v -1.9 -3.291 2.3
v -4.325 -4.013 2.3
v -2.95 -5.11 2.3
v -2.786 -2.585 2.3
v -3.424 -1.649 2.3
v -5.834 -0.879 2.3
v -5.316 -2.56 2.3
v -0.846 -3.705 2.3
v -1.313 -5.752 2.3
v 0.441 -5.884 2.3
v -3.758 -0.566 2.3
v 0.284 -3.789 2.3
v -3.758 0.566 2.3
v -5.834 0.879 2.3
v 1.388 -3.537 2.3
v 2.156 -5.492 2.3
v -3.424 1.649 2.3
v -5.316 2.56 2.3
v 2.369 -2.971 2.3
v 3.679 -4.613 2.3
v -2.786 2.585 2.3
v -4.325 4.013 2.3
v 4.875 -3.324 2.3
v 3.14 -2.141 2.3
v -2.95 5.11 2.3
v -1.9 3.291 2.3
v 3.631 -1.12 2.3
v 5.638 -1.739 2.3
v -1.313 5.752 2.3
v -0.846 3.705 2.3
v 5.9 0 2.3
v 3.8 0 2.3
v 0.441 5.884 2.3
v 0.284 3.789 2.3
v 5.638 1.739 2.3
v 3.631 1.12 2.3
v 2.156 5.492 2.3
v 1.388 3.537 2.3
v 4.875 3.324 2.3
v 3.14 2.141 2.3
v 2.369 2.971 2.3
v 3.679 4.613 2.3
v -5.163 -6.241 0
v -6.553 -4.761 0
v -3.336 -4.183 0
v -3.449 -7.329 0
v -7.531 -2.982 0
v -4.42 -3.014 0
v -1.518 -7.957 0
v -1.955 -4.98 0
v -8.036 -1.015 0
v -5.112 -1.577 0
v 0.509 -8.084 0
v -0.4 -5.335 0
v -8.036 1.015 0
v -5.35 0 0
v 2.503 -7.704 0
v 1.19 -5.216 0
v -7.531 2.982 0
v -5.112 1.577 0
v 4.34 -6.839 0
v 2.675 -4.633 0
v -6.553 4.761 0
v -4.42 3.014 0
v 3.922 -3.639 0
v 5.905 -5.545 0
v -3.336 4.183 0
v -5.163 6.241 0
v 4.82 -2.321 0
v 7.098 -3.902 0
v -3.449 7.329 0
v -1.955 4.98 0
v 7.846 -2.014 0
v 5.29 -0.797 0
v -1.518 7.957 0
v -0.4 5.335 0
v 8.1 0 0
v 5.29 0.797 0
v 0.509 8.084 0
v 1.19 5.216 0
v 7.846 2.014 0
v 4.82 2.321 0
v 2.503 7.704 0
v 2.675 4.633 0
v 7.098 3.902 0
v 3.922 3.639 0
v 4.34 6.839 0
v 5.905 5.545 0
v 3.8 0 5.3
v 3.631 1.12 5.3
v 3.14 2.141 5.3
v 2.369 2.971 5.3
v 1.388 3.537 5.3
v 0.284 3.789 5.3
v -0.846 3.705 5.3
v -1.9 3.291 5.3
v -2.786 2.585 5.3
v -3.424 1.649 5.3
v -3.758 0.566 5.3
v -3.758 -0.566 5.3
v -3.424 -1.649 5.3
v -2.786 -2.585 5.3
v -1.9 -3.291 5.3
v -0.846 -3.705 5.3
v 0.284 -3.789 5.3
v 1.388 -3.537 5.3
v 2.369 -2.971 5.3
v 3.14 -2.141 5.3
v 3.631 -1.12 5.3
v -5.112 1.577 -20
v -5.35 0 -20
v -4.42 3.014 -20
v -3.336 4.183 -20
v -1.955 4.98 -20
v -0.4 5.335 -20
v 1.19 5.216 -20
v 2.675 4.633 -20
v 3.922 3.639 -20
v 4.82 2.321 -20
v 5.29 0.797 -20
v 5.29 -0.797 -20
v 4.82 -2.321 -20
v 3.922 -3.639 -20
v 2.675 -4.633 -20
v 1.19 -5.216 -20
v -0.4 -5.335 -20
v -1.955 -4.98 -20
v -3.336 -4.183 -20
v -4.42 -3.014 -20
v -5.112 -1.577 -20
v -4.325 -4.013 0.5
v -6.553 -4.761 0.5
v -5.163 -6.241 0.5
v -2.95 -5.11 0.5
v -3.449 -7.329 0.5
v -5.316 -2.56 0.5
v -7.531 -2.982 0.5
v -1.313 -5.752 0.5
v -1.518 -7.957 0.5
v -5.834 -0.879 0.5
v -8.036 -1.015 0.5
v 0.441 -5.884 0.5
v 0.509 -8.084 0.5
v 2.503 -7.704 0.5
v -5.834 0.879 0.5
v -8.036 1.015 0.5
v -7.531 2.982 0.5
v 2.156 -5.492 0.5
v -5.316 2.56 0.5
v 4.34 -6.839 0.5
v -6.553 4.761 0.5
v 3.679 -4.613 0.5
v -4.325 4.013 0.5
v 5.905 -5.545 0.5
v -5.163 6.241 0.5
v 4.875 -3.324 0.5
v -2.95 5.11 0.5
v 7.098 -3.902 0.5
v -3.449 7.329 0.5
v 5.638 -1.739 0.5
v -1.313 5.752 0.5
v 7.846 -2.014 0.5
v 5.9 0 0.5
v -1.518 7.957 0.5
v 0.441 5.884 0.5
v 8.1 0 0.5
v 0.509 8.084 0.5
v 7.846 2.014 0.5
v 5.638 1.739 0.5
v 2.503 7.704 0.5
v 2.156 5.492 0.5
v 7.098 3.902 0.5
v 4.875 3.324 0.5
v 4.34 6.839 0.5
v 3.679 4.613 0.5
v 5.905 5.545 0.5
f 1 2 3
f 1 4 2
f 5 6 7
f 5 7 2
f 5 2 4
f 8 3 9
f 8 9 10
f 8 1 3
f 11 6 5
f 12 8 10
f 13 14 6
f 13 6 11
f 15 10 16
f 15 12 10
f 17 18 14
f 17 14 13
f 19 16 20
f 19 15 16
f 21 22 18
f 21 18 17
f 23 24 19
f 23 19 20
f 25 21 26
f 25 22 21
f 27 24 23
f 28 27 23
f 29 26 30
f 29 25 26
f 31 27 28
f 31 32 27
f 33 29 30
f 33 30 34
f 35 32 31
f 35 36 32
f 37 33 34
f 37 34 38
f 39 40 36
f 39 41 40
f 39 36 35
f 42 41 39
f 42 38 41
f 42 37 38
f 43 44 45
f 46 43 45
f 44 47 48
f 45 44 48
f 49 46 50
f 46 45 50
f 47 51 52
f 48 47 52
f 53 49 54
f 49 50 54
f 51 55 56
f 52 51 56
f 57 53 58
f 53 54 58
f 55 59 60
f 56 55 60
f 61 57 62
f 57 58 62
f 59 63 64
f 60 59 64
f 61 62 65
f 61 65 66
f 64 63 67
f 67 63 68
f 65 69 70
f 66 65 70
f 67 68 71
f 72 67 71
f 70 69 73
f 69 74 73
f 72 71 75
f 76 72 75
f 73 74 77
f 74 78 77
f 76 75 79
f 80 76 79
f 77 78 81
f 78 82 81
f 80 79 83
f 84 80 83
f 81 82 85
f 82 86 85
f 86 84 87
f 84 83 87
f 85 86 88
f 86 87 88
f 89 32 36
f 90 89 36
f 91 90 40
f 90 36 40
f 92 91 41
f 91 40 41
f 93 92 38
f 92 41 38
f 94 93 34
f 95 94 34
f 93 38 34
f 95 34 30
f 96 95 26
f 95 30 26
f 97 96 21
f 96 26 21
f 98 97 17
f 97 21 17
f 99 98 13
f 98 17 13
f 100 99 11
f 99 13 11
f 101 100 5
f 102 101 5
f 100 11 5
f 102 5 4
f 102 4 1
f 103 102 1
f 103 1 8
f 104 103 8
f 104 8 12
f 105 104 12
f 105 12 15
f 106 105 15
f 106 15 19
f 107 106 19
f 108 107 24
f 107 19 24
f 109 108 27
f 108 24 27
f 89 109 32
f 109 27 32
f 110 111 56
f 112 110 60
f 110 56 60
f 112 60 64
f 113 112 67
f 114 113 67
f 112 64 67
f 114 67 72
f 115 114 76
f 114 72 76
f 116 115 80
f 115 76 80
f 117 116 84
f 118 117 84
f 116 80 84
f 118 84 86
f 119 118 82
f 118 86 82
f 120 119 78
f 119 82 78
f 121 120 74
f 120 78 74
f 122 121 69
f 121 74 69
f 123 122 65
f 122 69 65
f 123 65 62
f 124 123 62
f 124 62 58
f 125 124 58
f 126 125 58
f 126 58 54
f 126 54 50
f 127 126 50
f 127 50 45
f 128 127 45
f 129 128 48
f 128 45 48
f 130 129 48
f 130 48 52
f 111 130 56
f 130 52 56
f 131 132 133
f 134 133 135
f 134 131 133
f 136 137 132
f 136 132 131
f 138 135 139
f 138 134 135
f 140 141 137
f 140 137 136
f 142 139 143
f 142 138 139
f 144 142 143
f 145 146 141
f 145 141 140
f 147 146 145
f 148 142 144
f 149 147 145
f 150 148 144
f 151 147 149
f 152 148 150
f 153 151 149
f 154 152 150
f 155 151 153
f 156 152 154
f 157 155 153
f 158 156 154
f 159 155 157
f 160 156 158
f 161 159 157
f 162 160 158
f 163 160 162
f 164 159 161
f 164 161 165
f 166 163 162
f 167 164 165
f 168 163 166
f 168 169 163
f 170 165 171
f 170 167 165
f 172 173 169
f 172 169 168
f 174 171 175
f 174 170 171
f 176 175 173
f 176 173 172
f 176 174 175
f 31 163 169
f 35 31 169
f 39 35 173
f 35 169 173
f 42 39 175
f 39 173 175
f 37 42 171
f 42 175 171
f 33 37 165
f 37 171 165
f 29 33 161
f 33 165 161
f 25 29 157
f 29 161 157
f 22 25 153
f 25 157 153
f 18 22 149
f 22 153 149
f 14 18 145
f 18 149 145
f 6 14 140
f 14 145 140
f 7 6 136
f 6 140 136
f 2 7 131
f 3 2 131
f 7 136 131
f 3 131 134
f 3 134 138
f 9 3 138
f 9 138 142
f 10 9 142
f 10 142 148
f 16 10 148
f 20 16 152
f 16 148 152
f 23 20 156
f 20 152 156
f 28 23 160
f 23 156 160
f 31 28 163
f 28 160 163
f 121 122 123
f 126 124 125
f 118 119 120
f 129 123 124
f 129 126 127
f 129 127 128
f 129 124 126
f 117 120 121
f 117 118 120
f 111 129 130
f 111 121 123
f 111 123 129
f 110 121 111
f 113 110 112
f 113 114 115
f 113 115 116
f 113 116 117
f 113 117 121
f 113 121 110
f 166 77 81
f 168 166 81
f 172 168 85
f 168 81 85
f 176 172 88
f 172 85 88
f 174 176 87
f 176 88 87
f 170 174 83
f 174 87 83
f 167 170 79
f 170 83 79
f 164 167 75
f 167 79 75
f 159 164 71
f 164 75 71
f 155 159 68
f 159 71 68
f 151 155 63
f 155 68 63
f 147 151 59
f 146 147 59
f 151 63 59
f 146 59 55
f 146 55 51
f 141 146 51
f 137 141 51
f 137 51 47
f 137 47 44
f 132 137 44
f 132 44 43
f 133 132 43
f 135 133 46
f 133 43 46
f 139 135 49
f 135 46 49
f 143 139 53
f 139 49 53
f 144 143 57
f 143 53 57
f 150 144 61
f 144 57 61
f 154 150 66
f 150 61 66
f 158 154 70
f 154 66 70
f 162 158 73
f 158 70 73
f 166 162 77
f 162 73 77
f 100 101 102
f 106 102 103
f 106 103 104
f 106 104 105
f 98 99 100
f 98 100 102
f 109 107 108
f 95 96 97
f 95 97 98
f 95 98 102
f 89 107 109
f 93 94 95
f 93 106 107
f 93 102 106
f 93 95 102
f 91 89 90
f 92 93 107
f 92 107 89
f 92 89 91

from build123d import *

# Parameters (mm, degrees)
ESQUISSE1_R        = 8.1
BOSS_EXTRU_1_DEPTH = 0.5
ESQUISSE2_R        = 5.9
BOSS_EXTRU_2_DEPTH = 1.8
ESQUISSE3_R        = 3.8
BOSS_EXTRU_3_DEPTH = 3
ESQUISSE4_R        = 5.35
BOSS_EXTRU_4_DEPTH = 20


with BuildPart() as part:
    # Esquisse1 → Boss.-Extru.1 (new body)
    with BuildSketch(Plane.XY):
        Circle(ESQUISSE1_R)
    extrude(amount=BOSS_EXTRU_1_DEPTH)

    # Esquisse2 → Boss.-Extru.2 (add)
    with BuildSketch(Plane.XY.offset(0.5)):
        Circle(ESQUISSE2_R)
    extrude(amount=BOSS_EXTRU_2_DEPTH)

    # Esquisse3 → Boss.-Extru.3 (add)
    with BuildSketch(Plane.XY.offset(2.3)):
        Circle(ESQUISSE3_R)
    extrude(amount=BOSS_EXTRU_3_DEPTH)

    # Esquisse4 → Boss.-Extru.4 (add)
    with BuildSketch(Plane(origin=(0, 0, 0), x_dir=(-1, 0, 0), z_dir=(0, 0, -1))):
        Circle(ESQUISSE4_R)
    extrude(amount=BOSS_EXTRU_4_DEPTH)


solid = part.part
